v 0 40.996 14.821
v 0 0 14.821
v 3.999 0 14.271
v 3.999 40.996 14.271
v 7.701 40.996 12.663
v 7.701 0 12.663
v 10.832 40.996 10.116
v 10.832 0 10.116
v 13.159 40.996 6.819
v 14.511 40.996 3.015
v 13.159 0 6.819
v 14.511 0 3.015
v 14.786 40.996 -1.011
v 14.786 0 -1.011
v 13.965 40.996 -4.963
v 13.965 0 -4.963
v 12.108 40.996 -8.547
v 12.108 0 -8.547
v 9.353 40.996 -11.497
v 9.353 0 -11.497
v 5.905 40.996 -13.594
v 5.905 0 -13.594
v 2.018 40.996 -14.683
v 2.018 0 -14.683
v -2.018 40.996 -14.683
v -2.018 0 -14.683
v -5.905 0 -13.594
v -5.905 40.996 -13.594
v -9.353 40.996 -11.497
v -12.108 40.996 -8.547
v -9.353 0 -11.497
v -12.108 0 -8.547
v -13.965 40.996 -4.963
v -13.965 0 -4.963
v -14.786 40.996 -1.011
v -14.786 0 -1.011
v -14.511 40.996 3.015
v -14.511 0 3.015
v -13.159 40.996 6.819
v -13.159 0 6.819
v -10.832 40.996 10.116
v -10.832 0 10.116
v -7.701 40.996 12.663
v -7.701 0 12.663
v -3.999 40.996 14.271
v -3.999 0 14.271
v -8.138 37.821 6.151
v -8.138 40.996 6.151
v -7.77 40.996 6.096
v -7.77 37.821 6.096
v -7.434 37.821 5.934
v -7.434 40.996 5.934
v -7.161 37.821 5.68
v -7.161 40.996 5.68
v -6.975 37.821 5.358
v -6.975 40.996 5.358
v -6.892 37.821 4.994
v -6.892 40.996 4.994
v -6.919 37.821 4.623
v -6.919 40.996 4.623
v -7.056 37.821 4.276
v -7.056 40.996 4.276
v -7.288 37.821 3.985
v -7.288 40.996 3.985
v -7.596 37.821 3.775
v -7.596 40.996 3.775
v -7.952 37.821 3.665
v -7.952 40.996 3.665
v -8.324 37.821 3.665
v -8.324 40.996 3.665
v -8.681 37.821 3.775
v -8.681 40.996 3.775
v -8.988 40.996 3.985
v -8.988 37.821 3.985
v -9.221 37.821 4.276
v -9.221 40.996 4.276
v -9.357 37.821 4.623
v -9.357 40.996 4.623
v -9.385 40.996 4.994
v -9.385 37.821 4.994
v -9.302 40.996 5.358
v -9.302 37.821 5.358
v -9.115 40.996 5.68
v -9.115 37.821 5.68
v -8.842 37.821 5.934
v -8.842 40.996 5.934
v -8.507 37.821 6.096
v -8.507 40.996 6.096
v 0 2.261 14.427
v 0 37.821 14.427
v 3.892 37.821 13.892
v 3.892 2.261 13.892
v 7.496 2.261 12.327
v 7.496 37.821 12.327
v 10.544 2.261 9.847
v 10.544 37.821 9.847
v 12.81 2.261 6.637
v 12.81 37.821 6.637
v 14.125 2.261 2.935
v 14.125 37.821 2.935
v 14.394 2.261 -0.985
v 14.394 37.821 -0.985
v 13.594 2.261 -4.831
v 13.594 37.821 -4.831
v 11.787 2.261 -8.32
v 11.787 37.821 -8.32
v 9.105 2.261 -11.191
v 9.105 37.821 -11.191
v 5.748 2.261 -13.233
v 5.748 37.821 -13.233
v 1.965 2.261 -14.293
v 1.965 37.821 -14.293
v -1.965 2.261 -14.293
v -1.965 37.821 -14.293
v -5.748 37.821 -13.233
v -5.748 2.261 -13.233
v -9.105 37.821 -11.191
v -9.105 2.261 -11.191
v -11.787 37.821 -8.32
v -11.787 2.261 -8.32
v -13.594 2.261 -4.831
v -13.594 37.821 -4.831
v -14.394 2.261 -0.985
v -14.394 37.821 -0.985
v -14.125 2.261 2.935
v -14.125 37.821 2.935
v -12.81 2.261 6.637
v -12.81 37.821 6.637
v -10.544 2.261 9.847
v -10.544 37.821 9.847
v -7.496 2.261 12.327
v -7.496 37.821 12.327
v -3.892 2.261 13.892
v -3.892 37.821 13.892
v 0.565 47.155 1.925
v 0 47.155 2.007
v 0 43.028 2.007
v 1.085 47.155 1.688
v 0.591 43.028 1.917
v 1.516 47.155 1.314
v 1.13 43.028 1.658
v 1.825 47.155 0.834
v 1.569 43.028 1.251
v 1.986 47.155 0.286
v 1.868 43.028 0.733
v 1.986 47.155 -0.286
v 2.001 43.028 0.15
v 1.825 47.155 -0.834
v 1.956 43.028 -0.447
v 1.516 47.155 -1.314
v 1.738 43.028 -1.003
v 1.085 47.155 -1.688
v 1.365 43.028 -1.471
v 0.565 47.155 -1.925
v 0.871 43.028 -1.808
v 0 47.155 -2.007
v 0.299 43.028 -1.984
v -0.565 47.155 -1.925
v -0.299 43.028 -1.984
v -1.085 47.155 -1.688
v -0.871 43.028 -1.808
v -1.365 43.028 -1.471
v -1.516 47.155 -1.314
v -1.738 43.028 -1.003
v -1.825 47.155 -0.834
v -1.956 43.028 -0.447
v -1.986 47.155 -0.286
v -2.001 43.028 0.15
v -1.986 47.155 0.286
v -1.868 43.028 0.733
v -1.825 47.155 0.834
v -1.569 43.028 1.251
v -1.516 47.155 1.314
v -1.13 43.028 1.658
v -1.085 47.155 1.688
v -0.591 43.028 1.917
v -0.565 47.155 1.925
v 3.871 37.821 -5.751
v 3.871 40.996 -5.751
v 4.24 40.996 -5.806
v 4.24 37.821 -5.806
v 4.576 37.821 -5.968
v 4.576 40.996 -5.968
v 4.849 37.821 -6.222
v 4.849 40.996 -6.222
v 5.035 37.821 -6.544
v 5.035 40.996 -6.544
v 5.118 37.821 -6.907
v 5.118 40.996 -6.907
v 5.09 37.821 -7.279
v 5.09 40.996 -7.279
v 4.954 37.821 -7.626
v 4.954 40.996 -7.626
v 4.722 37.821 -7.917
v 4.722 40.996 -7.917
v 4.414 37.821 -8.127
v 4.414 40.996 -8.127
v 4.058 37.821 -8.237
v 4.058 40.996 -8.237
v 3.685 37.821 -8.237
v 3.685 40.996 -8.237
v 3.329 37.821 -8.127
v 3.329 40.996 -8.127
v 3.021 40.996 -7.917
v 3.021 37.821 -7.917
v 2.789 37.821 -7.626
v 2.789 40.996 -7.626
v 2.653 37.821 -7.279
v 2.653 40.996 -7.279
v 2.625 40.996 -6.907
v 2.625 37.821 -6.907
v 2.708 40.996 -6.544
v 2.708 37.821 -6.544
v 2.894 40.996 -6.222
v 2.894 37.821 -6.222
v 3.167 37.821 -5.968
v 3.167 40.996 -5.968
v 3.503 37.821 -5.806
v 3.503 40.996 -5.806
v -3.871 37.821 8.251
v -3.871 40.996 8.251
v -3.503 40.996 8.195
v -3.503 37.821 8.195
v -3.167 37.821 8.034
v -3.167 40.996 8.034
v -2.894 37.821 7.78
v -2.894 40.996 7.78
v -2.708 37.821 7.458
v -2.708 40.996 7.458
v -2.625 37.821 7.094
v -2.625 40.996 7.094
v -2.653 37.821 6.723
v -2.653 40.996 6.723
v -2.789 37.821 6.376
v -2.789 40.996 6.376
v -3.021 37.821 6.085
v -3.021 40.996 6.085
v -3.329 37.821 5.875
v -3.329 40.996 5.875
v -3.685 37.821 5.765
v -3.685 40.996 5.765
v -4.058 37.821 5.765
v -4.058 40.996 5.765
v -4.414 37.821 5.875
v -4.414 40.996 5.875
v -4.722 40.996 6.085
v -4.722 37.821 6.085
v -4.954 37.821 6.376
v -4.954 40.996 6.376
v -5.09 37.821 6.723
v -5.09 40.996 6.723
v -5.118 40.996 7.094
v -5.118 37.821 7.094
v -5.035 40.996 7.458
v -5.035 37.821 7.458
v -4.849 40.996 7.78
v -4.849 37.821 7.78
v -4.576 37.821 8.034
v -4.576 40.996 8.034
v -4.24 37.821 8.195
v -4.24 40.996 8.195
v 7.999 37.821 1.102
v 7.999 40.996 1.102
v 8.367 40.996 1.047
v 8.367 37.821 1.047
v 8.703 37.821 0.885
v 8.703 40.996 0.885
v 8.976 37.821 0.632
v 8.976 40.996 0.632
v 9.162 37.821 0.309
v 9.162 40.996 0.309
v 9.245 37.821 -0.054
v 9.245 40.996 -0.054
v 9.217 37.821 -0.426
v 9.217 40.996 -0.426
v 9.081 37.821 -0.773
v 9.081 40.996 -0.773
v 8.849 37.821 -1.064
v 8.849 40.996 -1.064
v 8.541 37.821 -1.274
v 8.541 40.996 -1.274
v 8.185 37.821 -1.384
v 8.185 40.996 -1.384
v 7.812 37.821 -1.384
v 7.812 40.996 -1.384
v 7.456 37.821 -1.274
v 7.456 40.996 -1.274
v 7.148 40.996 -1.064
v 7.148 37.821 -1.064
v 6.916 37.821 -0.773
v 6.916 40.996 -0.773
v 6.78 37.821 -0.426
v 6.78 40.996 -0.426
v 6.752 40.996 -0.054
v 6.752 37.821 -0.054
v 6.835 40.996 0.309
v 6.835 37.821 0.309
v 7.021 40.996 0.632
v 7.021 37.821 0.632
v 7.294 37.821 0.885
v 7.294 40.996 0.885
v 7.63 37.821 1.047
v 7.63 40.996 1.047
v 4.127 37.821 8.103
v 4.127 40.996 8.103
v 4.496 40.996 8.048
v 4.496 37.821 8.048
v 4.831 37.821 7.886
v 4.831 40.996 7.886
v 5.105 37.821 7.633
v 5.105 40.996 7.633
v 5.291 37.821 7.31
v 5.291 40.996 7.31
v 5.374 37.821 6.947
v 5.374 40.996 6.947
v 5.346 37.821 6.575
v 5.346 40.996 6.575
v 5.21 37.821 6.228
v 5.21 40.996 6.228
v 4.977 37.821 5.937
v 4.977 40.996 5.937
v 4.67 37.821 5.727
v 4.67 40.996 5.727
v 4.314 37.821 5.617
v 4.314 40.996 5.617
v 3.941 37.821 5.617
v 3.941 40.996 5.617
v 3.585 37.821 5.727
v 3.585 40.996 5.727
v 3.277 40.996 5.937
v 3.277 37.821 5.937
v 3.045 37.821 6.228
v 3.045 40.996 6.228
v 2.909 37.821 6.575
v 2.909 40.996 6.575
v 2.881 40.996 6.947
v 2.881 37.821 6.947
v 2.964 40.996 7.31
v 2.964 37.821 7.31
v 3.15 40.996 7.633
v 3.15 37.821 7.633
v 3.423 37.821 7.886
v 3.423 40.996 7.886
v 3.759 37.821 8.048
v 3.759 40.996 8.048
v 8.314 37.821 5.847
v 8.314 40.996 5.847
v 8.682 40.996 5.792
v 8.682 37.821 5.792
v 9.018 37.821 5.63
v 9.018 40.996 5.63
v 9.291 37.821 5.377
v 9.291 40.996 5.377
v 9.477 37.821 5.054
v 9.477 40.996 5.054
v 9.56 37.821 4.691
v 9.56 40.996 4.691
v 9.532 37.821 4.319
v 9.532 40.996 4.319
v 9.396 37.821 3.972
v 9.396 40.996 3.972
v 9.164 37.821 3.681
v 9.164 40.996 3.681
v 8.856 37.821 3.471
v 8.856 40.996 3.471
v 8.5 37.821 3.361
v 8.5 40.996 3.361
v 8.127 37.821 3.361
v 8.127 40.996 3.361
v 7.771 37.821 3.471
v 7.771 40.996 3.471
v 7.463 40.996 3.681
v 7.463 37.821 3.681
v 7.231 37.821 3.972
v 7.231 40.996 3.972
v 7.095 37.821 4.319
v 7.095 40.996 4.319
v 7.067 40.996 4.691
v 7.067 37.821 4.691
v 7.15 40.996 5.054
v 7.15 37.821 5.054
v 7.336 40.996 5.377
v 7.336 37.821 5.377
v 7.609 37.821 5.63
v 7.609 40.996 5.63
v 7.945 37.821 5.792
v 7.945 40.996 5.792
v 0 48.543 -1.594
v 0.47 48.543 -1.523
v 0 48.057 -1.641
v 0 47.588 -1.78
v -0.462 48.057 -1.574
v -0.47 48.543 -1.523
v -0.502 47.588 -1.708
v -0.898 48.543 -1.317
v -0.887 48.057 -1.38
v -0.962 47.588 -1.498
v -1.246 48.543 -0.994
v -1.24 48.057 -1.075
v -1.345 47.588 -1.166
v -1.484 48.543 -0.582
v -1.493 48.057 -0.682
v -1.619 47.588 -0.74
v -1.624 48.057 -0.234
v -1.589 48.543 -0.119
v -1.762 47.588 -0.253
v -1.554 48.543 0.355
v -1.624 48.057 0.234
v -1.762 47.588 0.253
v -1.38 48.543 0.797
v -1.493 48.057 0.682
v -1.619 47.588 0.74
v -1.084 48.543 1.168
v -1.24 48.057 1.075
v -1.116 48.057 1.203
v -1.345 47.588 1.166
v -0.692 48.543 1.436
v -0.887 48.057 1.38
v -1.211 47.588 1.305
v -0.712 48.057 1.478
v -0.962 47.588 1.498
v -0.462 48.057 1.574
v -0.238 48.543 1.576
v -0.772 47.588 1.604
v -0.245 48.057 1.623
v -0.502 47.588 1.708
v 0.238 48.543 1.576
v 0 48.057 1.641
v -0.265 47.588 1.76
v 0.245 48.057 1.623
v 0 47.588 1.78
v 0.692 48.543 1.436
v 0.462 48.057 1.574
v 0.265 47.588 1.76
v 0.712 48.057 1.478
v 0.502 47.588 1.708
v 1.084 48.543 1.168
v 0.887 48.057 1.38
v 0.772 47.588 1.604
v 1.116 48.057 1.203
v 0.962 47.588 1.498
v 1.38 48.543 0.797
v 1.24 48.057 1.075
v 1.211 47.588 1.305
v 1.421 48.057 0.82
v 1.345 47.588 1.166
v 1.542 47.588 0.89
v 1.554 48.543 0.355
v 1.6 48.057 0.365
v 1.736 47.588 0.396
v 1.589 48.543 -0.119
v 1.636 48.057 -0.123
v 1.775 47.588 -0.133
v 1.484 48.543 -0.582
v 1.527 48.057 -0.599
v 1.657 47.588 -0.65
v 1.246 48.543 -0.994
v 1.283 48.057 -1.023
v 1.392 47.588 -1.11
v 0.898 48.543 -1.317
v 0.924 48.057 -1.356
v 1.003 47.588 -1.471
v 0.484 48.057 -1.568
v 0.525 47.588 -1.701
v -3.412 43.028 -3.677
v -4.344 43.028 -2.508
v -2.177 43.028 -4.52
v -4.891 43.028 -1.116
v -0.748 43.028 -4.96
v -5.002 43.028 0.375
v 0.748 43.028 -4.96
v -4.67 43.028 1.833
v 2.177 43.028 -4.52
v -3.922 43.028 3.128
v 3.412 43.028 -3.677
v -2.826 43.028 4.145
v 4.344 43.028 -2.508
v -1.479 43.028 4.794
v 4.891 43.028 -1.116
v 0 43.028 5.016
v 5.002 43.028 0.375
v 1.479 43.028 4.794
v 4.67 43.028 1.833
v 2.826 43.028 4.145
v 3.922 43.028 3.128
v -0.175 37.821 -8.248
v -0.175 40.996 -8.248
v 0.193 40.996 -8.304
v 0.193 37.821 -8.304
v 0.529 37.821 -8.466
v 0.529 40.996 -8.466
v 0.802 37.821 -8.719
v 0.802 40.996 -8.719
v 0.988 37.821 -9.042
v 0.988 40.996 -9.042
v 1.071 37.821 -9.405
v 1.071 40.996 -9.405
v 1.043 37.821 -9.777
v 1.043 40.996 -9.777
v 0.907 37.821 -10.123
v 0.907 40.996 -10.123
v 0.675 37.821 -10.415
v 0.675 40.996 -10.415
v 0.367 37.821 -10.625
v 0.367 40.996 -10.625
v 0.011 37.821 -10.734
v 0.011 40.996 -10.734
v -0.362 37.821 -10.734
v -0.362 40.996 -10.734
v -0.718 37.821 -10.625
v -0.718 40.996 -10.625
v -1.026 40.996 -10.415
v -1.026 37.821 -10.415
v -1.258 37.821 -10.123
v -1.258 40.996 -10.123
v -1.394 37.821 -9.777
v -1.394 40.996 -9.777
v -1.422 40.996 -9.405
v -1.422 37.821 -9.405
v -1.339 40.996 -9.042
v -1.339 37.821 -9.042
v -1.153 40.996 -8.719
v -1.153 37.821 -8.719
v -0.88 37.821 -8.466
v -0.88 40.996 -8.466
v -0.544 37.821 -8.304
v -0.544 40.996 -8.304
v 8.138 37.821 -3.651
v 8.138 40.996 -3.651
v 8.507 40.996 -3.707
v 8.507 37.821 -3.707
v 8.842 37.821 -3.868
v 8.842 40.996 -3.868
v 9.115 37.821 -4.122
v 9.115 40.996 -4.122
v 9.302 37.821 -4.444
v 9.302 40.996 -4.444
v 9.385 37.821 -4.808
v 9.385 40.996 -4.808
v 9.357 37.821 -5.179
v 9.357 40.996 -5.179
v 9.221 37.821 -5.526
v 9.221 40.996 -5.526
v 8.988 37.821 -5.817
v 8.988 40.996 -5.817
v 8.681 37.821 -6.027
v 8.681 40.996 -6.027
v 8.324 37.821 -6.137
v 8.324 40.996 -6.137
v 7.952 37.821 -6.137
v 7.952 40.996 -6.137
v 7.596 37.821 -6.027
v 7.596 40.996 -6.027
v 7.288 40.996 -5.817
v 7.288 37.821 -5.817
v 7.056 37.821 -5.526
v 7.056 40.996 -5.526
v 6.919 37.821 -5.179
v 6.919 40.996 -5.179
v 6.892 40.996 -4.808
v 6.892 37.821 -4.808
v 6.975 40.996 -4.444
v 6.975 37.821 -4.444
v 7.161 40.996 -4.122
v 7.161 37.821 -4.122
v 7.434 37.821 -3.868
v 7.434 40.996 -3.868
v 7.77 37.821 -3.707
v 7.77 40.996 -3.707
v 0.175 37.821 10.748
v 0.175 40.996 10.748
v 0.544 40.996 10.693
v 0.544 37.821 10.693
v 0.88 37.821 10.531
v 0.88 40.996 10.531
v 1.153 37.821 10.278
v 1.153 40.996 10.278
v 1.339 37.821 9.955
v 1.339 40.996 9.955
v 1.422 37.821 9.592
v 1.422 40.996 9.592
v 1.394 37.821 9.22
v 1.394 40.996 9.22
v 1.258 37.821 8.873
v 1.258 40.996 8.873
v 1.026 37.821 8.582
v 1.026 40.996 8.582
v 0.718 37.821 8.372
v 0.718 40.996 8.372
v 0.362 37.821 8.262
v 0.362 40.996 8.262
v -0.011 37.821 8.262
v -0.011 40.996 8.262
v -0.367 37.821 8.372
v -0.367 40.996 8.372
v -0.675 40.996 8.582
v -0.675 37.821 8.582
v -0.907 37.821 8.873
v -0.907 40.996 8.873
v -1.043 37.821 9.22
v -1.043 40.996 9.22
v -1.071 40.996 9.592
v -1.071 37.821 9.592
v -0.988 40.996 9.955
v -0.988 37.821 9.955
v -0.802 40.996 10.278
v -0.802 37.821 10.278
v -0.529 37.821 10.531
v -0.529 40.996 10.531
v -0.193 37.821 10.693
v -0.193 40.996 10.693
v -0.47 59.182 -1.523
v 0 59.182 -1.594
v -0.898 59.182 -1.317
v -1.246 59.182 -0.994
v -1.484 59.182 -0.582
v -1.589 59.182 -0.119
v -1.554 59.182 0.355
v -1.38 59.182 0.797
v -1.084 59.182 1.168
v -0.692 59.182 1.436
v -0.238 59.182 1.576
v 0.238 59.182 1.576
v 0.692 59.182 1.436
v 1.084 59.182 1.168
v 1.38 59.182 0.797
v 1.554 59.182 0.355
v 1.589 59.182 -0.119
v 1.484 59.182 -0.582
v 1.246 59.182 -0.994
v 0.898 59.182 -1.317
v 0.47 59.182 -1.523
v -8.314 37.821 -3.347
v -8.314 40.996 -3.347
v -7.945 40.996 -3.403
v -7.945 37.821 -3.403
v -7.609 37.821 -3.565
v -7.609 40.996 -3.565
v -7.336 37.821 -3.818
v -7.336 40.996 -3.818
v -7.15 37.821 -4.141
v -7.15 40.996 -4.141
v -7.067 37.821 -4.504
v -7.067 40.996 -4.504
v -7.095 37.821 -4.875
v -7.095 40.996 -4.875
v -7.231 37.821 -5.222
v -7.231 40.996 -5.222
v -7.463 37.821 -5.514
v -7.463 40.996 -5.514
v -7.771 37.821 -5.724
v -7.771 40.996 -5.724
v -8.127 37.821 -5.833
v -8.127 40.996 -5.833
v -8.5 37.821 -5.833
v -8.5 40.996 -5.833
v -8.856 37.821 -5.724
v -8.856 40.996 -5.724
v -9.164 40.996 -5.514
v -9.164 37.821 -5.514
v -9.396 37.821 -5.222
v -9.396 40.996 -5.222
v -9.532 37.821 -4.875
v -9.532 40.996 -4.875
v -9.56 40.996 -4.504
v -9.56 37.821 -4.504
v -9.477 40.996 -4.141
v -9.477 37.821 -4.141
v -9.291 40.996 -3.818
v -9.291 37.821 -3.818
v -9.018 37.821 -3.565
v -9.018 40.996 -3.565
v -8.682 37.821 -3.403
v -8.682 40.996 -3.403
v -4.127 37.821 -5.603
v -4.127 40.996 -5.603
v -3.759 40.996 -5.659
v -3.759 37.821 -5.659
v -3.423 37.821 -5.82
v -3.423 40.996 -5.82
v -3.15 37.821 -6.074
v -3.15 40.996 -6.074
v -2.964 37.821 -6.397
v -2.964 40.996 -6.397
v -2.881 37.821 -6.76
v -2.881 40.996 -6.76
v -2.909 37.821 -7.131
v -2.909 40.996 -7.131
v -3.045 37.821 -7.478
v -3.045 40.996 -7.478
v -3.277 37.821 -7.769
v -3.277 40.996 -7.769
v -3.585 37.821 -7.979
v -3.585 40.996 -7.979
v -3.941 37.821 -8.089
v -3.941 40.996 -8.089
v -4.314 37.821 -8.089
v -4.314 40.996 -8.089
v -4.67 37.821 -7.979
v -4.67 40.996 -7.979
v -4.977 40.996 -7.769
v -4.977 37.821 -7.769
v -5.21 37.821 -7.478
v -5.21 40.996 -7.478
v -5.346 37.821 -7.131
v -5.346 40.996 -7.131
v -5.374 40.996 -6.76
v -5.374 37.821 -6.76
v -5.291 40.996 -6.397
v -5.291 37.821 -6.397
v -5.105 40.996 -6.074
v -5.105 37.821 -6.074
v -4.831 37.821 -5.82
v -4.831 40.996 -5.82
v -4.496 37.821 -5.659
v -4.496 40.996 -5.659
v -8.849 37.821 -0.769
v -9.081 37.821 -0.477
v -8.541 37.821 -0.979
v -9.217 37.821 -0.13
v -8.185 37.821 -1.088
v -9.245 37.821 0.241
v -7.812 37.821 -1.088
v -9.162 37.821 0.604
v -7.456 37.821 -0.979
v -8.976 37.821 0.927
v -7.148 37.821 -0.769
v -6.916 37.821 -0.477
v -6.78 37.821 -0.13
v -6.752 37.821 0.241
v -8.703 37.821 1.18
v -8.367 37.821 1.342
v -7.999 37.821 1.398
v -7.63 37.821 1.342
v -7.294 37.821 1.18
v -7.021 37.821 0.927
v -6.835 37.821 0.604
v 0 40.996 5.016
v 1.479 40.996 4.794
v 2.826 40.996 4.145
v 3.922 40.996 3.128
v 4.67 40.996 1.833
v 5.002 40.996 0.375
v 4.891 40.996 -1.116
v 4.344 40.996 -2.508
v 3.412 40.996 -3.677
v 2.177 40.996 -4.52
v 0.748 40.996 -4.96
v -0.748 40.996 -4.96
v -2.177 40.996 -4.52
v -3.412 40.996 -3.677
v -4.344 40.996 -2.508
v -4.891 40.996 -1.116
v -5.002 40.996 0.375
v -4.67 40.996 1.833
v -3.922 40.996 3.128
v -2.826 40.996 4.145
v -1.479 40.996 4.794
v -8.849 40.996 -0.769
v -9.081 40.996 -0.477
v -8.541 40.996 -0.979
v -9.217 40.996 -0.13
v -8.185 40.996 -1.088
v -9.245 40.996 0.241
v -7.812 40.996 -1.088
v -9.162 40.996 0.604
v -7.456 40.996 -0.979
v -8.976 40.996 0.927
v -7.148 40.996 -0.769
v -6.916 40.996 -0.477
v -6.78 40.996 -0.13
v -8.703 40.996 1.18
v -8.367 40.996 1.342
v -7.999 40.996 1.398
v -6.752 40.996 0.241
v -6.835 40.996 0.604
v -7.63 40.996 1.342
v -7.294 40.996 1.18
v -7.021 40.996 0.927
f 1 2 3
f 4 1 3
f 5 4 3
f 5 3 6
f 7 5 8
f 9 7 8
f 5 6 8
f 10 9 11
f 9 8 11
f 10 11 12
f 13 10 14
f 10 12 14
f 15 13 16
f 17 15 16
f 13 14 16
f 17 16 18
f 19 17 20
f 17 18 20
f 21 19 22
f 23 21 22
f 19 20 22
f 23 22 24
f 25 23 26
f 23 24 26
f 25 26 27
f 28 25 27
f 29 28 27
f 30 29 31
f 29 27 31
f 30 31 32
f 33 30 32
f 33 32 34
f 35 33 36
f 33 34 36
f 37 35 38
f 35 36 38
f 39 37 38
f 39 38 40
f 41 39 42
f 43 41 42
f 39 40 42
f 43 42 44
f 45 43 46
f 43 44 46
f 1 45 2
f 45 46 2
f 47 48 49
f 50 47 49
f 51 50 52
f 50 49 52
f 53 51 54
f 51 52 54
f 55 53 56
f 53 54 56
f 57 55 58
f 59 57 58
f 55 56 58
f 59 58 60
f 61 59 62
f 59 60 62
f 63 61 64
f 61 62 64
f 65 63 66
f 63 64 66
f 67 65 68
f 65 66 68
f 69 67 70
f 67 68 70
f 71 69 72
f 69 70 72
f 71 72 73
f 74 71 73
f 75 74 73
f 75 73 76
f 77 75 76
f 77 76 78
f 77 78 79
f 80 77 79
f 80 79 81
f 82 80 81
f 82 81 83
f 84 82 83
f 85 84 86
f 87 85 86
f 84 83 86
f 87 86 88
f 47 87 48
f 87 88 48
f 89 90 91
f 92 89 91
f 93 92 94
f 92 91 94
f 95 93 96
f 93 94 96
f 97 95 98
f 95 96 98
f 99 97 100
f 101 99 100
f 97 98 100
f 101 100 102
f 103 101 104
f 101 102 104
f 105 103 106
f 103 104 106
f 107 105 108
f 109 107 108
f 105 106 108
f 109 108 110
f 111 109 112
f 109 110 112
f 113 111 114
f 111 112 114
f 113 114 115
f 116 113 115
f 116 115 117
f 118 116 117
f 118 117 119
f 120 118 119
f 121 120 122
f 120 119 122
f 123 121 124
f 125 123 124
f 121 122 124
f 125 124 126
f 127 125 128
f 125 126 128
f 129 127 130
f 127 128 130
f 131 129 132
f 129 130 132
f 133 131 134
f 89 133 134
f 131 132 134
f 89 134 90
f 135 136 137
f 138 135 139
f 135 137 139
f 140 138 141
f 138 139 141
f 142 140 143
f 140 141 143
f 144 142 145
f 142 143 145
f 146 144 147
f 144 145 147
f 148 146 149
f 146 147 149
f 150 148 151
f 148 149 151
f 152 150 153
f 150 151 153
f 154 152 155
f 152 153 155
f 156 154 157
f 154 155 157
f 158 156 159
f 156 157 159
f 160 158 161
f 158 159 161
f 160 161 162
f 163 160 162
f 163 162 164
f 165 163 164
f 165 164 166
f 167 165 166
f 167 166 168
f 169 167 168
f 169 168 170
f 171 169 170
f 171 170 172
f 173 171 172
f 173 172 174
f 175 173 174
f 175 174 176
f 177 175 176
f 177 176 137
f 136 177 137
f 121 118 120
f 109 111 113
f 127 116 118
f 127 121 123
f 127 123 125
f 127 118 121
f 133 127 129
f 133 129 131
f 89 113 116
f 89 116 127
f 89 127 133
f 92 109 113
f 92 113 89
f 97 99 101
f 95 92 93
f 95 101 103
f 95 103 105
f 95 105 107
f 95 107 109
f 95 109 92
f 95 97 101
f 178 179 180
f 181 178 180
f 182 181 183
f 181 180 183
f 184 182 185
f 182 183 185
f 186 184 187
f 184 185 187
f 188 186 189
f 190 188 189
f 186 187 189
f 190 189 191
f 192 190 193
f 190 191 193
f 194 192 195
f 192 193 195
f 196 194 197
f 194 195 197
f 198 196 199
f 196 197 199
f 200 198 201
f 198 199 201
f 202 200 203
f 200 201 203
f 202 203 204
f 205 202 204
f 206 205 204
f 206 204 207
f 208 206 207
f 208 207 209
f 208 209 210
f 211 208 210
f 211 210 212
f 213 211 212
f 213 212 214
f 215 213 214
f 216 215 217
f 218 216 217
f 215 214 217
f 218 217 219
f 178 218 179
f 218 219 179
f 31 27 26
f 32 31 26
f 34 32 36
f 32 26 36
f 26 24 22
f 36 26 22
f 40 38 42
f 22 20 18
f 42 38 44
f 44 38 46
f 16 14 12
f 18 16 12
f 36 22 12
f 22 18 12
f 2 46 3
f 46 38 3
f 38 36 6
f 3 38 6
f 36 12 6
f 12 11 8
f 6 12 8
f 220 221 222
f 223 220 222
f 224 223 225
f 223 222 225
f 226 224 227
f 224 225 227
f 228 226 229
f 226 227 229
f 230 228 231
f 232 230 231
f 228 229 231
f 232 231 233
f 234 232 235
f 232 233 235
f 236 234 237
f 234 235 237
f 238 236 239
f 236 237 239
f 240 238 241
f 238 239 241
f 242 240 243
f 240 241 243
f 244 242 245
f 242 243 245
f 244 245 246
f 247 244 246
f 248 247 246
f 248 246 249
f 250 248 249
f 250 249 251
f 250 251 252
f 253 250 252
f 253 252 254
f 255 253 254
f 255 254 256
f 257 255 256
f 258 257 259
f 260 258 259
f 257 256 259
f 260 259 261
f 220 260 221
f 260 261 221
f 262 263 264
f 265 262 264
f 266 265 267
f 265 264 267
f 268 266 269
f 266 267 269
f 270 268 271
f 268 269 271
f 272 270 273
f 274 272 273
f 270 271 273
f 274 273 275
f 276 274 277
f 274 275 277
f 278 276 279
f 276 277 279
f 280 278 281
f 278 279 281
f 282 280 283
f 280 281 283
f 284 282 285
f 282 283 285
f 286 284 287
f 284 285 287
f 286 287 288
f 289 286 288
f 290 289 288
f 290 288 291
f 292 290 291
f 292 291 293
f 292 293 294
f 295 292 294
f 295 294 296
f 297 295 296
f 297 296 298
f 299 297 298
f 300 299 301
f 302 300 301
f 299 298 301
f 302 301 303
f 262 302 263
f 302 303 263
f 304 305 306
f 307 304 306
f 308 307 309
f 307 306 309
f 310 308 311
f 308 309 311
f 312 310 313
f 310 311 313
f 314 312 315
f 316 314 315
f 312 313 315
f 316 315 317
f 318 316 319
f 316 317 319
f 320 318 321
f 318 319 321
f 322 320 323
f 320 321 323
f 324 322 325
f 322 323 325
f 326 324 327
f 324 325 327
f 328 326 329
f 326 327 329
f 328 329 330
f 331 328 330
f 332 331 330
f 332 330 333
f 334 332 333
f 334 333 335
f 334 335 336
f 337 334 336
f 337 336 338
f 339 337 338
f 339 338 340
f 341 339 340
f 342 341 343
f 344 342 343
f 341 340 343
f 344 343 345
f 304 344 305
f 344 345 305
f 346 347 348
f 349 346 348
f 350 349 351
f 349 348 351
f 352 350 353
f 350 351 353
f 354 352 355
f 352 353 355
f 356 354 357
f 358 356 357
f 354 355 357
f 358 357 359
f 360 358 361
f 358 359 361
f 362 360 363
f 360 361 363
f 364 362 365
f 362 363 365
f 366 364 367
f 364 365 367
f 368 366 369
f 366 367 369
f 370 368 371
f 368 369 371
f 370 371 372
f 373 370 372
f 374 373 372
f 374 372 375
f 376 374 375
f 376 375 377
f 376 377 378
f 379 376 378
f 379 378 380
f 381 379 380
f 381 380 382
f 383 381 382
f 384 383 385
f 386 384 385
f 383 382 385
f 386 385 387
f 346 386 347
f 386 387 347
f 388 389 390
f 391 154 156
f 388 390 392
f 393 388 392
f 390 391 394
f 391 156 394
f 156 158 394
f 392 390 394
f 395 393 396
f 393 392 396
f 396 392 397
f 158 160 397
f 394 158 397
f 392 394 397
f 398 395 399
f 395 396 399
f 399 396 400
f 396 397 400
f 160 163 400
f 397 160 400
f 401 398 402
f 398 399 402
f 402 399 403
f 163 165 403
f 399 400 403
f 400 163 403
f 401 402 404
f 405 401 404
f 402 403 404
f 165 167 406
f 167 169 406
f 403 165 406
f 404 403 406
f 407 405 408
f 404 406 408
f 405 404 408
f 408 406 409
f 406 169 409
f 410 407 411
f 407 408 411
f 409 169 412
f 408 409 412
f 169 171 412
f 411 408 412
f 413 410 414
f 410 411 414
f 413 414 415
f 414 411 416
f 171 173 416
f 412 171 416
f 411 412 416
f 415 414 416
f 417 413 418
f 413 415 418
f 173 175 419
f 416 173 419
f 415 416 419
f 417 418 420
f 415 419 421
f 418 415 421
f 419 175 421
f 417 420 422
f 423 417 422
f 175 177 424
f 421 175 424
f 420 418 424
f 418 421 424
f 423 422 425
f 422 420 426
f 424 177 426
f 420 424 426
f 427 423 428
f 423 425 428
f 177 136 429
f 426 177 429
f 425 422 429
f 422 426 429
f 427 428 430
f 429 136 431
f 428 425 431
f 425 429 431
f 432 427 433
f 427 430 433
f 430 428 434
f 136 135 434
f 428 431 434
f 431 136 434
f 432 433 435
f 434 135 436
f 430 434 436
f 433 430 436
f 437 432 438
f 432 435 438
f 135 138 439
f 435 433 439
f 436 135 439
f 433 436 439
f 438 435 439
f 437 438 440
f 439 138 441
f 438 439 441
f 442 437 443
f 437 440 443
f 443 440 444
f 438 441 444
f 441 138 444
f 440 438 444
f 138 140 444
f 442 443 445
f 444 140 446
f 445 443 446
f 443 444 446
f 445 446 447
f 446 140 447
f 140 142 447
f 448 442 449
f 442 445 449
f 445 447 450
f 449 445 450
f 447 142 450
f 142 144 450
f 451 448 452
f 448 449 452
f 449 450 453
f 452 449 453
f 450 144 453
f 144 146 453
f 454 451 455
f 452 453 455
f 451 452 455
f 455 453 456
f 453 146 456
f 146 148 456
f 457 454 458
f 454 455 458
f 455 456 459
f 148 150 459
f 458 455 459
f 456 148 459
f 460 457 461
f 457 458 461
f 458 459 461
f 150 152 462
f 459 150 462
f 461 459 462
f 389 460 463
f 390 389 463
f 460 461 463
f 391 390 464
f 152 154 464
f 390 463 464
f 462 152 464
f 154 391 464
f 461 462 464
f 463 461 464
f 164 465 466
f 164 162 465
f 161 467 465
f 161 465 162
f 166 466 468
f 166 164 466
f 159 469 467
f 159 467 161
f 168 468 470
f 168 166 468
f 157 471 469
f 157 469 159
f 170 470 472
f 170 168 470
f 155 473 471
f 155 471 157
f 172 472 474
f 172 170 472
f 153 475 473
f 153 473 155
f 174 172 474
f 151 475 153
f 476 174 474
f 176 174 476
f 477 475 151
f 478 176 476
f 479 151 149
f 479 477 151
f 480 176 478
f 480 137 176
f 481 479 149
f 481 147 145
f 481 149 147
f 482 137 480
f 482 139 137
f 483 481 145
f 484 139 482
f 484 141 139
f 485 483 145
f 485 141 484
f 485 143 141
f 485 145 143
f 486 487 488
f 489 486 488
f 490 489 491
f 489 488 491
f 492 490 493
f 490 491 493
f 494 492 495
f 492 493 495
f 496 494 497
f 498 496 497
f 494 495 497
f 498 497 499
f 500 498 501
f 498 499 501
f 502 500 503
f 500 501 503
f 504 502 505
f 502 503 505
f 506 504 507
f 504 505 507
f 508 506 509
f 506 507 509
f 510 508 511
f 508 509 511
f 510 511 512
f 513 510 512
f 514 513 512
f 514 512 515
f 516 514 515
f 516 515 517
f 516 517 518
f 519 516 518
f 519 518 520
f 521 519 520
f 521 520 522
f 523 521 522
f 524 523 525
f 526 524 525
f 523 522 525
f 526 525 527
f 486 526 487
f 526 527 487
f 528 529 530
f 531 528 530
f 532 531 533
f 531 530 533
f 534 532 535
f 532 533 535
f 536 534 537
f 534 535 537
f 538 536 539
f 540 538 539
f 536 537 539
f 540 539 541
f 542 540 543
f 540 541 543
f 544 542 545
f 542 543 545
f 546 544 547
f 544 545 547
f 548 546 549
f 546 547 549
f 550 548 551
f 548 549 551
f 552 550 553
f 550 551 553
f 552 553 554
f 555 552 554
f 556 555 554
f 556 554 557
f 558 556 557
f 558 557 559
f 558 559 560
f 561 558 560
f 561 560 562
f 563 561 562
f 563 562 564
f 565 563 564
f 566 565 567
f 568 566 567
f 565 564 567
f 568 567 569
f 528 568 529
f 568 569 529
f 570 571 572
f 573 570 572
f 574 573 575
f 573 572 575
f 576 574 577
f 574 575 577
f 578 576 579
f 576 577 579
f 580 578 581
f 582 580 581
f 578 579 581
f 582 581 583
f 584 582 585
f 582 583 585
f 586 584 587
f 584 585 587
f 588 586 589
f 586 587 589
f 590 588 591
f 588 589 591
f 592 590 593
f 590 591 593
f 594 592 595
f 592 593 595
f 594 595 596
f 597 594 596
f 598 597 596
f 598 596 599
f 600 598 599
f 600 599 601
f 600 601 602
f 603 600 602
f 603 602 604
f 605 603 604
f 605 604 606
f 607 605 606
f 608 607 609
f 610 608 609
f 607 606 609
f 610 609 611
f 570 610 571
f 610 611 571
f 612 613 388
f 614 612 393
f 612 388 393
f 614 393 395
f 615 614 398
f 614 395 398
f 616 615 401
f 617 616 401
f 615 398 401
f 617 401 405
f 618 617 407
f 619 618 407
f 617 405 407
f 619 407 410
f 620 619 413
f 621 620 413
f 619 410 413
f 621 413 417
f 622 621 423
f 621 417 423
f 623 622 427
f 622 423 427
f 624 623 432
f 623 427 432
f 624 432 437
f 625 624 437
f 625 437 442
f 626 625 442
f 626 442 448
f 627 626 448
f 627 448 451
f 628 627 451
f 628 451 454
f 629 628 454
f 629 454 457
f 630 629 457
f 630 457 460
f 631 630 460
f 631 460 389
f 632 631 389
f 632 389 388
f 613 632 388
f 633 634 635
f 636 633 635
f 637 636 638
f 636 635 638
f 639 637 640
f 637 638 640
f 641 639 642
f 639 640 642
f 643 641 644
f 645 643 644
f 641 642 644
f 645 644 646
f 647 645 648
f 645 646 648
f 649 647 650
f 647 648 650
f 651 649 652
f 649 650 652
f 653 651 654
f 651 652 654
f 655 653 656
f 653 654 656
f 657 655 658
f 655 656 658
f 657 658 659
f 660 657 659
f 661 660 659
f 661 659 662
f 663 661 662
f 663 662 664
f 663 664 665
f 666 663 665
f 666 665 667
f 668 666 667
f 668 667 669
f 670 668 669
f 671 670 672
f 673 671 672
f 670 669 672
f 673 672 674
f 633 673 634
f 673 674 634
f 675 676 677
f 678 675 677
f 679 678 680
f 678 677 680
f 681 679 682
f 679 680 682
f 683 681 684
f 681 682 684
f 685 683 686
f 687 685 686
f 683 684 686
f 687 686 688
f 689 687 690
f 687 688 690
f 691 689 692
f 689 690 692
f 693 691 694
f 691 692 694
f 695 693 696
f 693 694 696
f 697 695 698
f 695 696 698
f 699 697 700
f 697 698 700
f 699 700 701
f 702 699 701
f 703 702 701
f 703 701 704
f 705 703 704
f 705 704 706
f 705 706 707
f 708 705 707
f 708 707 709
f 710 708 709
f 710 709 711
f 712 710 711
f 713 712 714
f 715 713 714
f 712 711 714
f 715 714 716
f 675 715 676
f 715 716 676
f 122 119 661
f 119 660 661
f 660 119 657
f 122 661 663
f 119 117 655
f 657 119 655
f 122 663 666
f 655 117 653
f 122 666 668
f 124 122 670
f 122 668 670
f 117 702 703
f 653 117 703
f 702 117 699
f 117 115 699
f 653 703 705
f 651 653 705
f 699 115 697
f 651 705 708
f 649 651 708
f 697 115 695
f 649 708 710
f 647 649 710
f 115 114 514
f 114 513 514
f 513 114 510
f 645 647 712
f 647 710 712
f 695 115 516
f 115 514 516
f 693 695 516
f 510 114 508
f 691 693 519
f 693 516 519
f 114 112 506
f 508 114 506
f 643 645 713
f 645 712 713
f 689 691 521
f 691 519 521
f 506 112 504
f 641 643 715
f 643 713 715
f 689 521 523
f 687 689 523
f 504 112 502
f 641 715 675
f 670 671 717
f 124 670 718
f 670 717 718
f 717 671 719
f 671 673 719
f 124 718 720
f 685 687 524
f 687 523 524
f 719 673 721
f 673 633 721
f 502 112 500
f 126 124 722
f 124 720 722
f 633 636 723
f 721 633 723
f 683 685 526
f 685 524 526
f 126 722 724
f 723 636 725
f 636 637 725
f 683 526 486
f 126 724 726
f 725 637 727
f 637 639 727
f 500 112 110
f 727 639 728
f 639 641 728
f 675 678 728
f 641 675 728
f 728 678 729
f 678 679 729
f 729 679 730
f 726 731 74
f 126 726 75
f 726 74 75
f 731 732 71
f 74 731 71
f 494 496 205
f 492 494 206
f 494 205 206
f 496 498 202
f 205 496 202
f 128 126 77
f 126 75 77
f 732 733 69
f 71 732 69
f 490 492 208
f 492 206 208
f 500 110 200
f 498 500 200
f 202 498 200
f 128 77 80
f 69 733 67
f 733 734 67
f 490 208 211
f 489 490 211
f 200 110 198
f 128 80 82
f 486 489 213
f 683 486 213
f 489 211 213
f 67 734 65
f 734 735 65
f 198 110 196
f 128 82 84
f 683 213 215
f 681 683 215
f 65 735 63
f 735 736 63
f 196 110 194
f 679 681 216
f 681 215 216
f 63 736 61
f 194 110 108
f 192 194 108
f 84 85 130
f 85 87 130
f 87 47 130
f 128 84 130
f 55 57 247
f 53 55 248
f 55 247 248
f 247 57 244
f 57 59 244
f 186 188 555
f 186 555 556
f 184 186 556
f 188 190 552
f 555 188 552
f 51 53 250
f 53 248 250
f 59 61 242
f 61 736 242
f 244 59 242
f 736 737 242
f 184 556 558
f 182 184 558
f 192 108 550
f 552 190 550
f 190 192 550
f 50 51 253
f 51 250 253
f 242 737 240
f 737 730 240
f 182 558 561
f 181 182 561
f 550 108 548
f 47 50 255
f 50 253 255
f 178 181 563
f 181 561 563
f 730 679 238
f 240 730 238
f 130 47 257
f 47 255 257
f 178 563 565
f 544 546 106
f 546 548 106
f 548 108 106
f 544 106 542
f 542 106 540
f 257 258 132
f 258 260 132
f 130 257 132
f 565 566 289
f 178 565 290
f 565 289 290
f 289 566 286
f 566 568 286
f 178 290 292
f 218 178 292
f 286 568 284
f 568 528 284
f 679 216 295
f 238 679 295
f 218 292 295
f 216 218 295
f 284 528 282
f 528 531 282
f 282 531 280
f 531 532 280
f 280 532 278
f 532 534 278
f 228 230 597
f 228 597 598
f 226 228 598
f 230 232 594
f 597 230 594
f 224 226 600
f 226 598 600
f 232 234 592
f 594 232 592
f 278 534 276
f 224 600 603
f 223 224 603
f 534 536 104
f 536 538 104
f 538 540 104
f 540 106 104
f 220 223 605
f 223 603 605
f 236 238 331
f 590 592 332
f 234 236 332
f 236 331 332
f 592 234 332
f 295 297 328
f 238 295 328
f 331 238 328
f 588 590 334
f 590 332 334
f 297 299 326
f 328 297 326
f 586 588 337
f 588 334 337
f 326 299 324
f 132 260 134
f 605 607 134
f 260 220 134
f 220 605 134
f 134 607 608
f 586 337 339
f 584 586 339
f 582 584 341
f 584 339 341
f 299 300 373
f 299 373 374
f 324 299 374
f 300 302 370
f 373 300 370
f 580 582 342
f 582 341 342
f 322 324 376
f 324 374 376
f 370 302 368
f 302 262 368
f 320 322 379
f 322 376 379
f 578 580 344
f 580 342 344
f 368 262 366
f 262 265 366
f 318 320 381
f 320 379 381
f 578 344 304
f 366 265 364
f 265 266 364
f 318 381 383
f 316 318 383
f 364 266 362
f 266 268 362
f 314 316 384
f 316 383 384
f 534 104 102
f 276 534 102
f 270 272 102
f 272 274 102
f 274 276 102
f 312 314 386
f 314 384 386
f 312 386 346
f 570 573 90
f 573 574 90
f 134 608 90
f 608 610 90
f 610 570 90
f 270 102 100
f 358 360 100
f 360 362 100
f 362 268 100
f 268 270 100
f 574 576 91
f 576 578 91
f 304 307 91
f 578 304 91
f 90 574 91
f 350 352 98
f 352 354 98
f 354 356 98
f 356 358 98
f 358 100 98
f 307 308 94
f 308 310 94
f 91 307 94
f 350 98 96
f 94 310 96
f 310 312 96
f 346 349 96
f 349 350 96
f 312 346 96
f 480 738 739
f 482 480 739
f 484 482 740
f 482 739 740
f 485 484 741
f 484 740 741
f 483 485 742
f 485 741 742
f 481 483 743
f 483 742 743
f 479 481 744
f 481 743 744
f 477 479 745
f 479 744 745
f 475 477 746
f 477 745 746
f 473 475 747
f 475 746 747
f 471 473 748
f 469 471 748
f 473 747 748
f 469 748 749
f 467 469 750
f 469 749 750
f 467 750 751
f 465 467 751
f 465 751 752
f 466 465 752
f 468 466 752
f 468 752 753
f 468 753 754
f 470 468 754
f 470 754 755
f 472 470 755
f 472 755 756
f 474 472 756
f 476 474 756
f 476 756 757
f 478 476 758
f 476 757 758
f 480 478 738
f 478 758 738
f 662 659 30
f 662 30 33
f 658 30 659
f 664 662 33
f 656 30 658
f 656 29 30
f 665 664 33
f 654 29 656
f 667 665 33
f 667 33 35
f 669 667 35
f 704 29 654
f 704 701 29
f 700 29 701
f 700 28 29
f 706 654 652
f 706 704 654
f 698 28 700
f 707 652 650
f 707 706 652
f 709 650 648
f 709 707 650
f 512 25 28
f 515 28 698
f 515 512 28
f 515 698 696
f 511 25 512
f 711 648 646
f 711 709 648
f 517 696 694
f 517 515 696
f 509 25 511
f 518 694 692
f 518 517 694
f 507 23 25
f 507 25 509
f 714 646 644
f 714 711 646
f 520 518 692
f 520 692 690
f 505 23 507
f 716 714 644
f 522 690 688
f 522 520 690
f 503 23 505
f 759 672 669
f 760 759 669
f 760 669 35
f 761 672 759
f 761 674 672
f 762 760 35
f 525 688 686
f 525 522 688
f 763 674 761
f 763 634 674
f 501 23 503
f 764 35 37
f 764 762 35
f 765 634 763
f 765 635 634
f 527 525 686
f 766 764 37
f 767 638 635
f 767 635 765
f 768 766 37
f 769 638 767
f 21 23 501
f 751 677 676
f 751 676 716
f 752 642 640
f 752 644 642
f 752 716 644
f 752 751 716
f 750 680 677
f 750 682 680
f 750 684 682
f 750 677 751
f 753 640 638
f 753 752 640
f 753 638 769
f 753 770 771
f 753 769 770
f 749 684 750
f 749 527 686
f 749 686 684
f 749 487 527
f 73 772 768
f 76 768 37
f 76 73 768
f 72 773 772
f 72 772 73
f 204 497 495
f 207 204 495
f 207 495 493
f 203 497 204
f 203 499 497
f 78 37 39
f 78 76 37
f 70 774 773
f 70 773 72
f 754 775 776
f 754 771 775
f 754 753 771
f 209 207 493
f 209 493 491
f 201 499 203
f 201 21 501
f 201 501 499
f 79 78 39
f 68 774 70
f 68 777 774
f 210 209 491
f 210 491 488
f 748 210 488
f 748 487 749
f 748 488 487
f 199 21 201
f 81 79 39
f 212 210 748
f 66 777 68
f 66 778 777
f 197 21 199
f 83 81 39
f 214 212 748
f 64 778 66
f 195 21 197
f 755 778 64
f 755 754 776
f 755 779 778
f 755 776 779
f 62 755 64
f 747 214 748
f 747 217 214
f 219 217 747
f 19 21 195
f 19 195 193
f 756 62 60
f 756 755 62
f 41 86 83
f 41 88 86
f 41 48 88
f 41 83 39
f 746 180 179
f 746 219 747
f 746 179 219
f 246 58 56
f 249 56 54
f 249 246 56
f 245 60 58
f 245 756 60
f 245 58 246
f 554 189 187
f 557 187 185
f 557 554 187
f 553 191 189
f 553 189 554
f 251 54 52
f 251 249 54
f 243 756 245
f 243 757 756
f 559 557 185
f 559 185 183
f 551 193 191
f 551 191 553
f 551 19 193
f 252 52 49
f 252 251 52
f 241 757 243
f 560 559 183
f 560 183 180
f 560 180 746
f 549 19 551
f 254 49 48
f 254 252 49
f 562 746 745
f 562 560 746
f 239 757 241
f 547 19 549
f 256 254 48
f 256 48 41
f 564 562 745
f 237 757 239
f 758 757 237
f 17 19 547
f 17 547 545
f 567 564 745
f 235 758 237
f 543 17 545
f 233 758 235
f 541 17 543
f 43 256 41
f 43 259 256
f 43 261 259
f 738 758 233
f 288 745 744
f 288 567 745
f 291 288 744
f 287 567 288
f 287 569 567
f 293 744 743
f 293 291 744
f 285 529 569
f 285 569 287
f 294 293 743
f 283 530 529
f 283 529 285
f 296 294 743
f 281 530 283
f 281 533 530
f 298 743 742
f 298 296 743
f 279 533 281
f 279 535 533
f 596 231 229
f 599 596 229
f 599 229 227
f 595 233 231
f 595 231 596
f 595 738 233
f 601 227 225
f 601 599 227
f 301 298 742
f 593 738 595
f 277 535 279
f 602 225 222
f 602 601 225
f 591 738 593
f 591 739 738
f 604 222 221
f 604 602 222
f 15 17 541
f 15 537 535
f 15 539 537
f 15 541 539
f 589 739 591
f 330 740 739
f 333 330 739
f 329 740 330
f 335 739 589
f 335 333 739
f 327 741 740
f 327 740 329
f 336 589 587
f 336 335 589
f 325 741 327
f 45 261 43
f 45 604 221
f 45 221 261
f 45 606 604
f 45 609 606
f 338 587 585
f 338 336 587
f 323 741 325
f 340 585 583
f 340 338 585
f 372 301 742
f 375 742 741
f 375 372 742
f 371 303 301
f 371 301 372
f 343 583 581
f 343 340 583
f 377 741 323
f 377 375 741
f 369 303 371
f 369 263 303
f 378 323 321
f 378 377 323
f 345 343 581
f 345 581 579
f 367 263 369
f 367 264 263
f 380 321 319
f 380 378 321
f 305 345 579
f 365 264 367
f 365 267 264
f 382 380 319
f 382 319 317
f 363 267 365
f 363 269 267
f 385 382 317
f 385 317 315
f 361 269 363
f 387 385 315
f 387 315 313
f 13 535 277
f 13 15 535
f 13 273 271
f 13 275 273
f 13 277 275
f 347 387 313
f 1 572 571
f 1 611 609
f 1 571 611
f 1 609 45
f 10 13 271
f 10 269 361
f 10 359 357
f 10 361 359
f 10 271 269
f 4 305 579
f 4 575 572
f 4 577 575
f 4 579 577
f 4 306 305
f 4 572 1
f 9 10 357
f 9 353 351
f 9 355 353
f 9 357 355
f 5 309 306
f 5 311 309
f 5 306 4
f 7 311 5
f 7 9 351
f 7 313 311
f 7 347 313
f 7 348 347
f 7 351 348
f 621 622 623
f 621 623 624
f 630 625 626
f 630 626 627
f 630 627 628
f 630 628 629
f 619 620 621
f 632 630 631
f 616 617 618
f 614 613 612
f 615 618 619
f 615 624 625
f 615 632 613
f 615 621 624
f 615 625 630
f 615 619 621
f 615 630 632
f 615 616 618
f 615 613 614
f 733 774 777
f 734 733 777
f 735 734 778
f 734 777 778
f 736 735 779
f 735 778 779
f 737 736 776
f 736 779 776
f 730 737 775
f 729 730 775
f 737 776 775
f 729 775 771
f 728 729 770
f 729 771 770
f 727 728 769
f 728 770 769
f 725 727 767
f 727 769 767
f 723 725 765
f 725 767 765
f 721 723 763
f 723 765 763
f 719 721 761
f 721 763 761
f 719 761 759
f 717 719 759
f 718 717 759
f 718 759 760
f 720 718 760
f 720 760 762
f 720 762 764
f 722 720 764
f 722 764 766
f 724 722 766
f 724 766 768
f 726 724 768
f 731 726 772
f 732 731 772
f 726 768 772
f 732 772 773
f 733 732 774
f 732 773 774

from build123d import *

# Parameters (mm, degrees)
SKETCH1_R           = 14.8209
BOSS_EXTRUDE1_DEPTH = 40.9956
SKETCH2_R           = 5.0165
BOSS_EXTRUDE2_DEPTH = 2.032
SKETCH3_R           = 2.0066
BOSS_EXTRUDE3_DEPTH = 4.1275
SKETCH4_R           = 1.59385
BOSS_EXTRUDE4_DEPTH = 12.0269
FILLET1_R           = 2.54
SKETCH5_R           = 1.25
CUT_EXTRUDE1_DEPTH  = 3.175
SKETCH6_R           = 14.4272
CUT_EXTRUDE2_DEPTH  = 35.56


with BuildPart() as part:
    # Sketch1 → Boss-Extrude1 (new body)
    with BuildSketch(Plane(origin=(0, 0, 0), x_dir=(1, 0, 0), z_dir=(0, 1, 0))):
        with Locations(Location((0, 0, 0), (0, 0, 270))):
            Circle(SKETCH1_R)
    extrude(amount=BOSS_EXTRUDE1_DEPTH)

    # Sketch2 → Boss-Extrude2 (add)
    with BuildSketch(Plane(origin=(0, 40.9956, 0), x_dir=(1, 0, 0), z_dir=(0, 1, 0))):
        with Locations(Location((0, 0, 0), (0, 0, 270))):
            Circle(SKETCH2_R)
    extrude(amount=BOSS_EXTRUDE2_DEPTH)

    # Sketch3 → Boss-Extrude3 (add)
    with BuildSketch(Plane(origin=(0, 43.0276, 0), x_dir=(1, 0, 0), z_dir=(0, 1, 0))):
        with Locations(Location((0, 0, 0), (0, 0, 270))):
            Circle(SKETCH3_R)
    extrude(amount=BOSS_EXTRUDE3_DEPTH)

    # Sketch4 → Boss-Extrude4 (add)
    with BuildSketch(Plane(origin=(0, 47.1551, 0), x_dir=(1, 0, 0), z_dir=(0, 1, 0))):
        with Locations(Location((0, 0, 0), (0, 0, 90))):
            Circle(SKETCH4_R)
    extrude(amount=BOSS_EXTRUDE4_DEPTH)

    # Fillet1
    # the kernel refuses this fillet: 2.54 mm, written as the material it adds along each edge
    with BuildSketch(Plane(origin=(0, 47.1551, 0), x_dir=(0, 0, -1), z_dir=(1, 0, 0))) as fillet1_piece_1:
        with BuildLine():
            CenterArc((4.13385, 1.387950805), FILLET1_R, 180, 33.122940208)
            Line((1.59385, 1.387950805), (1.54305, 1.387950805))
            Line((1.54305, 1.387950805), (1.54305, 0))
            Line((1.54305, 0), (1.59385, -0.0508))
            ThreePointArc((1.59385, -0.0508), (1.800225, -0.0508), (1.964055, -0.027759016))
            Line((1.964055, -0.027759016), (2.0066, 0))
        make_face()
    revolve(axis=Axis((0, 47.1551, 0), (0, 1, 0)))

    # Sketch5 → Cut-Extrude1 (cut)
    with BuildSketch(Plane(origin=(0, 40.9956, 0), x_dir=(1, 0, 0), z_dir=(0, 1, 0))):
        with Locations(Location((-0.175376493, 9.498381077, 0), (0, 0, 270))):
            Circle(SKETCH5_R)
        with Locations(Location((3.871418981, 7.000865309, 0), (0, 0, 270))):
            Circle(SKETCH5_R)
        with Locations(Location((8.138151061, 4.901071037, 0), (0, 0, 270))):
            Circle(SKETCH5_R)
        with Locations(Location((7.998636697, 0.147685468, 0), (0, 0, 270))):
            Circle(SKETCH5_R)
        with Locations(Location((8.313527554, -4.59731004, 0), (0, 0, 270))):
            Circle(SKETCH5_R)
        with Locations(Location((0.175376493, -9.498381077, 0), (0, 0, 270))):
            Circle(SKETCH5_R)
        with Locations(Location((-3.871418981, -7.000865309, 0), (0, 0, 270))):
            Circle(SKETCH5_R)
        with Locations(Location((-8.138151061, -4.901071037, 0), (0, 0, 270))):
            Circle(SKETCH5_R)
        with Locations(Location((-7.998636697, -0.147685468, 0), (0, 0, 270))):
            Circle(SKETCH5_R)
        with Locations(Location((-4.127217715, 6.853179841, 0), (0, 0, 270))):
            Circle(SKETCH5_R)
        with Locations(Location((-8.313527554, 4.59731004, 0), (0, 0, 270))):
            Circle(SKETCH5_R)
        with Locations(Location((4.127217715, -6.853179841, 0), (0, 0, 270))):
            Circle(SKETCH5_R)
    extrude(amount=-CUT_EXTRUDE1_DEPTH, mode=Mode.SUBTRACT)

    # Sketch6 → Cut-Extrude2 (cut)
    with BuildSketch(Plane(origin=(0, 37.8206, 0), x_dir=(1, 0, 0), z_dir=(0, 1, 0))):
        with Locations(Location((0, 0, 0), (0, 0, 270))):
            Circle(SKETCH6_R)
    extrude(amount=-CUT_EXTRUDE2_DEPTH, mode=Mode.SUBTRACT)


solid = part.part
